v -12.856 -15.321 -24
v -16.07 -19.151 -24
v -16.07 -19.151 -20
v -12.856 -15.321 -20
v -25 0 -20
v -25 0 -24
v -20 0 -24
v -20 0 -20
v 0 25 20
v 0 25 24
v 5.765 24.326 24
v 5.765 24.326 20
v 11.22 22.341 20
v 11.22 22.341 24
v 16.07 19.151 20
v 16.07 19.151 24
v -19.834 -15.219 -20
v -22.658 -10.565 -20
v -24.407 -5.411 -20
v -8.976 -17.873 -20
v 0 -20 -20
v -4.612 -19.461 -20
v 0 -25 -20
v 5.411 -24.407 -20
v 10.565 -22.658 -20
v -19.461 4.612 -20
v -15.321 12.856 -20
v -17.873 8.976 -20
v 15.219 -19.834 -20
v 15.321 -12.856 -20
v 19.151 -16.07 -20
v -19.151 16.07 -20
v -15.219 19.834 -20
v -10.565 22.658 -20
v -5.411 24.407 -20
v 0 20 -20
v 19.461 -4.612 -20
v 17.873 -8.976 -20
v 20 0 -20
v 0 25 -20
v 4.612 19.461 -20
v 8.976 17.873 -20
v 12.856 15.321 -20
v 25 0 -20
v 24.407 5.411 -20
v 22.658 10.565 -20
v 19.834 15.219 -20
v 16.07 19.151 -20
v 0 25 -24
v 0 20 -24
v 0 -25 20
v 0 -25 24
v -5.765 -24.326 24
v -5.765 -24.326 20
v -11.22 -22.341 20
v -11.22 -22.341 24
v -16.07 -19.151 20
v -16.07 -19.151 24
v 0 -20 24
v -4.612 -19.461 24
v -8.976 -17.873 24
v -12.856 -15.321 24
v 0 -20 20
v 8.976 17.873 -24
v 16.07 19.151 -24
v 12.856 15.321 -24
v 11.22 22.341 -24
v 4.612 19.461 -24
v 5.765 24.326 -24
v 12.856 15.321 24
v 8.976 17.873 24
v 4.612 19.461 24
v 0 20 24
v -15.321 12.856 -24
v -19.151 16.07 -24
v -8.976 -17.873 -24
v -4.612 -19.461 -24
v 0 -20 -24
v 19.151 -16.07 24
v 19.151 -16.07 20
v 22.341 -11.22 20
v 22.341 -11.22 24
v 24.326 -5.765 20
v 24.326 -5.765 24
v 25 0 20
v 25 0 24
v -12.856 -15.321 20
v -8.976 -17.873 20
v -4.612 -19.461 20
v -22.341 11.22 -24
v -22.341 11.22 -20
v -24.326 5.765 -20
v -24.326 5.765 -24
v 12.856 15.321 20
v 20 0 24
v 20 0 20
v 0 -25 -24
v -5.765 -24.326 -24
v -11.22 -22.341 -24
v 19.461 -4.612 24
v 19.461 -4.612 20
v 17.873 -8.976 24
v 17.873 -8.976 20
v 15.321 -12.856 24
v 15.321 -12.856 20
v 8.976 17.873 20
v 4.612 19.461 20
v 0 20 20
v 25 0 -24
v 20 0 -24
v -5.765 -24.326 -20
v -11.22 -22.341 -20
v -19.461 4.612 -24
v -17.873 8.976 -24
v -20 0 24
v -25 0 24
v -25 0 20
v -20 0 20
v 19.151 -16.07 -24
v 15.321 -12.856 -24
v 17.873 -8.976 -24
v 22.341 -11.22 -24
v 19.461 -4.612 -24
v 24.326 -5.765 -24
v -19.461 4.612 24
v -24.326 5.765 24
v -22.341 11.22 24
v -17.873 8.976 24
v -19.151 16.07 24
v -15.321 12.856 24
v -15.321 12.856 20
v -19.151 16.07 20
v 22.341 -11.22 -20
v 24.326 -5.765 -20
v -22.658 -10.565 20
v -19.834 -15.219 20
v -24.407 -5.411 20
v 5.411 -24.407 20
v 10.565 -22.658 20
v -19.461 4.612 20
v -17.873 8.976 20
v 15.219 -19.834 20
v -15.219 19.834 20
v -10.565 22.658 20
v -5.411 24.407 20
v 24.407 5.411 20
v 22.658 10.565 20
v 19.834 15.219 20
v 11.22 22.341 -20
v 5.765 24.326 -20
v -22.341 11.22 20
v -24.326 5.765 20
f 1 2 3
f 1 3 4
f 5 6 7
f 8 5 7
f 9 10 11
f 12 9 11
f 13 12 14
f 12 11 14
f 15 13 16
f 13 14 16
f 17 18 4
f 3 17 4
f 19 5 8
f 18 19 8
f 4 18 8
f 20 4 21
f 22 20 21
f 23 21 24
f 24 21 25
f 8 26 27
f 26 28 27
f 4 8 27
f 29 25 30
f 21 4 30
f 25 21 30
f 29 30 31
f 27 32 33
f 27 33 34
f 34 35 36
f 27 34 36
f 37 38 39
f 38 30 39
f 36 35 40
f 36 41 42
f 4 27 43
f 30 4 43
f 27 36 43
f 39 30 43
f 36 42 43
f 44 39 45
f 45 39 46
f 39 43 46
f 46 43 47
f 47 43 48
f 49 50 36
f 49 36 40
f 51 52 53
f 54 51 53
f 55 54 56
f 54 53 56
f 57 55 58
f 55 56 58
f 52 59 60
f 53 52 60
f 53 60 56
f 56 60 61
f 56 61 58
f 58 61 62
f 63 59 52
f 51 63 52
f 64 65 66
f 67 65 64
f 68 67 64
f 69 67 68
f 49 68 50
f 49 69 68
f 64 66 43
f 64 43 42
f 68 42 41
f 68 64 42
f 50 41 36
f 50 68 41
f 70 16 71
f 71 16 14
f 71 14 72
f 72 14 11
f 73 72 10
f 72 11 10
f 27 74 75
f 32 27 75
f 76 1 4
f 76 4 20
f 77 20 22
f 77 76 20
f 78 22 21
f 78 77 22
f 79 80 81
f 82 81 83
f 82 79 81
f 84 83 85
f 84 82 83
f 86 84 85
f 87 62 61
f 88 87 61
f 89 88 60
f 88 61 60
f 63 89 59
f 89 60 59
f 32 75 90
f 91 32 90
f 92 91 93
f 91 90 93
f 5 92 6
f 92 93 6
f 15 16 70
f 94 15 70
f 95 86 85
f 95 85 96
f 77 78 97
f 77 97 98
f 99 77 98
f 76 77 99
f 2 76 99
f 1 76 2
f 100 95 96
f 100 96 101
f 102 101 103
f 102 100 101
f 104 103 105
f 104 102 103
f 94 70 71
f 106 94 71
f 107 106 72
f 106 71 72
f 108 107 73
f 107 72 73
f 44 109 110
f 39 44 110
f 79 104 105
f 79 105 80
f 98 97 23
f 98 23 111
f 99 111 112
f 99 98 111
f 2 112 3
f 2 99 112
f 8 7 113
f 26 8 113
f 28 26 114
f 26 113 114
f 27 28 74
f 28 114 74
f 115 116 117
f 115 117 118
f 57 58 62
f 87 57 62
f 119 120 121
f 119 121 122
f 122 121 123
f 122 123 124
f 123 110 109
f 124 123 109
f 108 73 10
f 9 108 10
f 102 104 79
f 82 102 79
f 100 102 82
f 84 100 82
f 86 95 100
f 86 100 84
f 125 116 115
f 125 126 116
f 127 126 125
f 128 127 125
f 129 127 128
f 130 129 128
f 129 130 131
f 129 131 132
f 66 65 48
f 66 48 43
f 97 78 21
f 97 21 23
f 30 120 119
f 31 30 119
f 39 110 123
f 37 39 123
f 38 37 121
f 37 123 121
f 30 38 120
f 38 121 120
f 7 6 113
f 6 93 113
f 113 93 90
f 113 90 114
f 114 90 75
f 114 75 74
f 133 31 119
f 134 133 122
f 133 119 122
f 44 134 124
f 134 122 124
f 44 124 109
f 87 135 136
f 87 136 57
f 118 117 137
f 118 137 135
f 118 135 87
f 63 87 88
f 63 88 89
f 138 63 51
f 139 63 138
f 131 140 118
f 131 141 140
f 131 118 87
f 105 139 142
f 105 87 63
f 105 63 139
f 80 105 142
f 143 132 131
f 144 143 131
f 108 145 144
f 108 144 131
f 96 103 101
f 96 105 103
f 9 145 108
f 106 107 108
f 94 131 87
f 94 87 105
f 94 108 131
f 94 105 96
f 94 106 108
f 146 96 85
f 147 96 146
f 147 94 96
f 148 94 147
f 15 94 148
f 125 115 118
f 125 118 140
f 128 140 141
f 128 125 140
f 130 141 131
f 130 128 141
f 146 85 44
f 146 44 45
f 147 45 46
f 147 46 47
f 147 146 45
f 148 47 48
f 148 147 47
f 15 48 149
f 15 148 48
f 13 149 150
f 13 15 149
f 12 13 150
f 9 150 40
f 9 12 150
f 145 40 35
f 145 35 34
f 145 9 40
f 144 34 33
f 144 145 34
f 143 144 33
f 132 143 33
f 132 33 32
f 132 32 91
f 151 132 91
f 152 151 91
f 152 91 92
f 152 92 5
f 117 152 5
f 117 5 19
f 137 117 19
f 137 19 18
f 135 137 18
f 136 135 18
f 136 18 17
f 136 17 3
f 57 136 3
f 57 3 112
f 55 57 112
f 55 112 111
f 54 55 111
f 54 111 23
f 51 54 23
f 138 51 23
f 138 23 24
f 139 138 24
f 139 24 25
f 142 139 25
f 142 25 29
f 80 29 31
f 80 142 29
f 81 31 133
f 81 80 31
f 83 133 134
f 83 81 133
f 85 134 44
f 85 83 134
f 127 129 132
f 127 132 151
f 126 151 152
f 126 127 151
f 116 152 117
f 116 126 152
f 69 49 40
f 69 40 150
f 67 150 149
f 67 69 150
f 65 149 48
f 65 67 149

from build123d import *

# Parameters (mm, degrees)
SKETCH1_R           = 25
BOSS_EXTRUDE1_DEPTH = 20
BOSS_EXTRUDE2_START = 4
BOSS_EXTRUDE2_DEPTH = 4


with BuildPart() as part:
    # Sketch1 → Boss-Extrude1 (new, symmetric)
    with BuildSketch(Plane.XY):
        Circle(SKETCH1_R)
    extrude(amount=BOSS_EXTRUDE1_DEPTH, both=True)

    # Sketch2 → Boss-Extrude2 (add)
    with BuildSketch(Plane.XY.offset(20).offset(BOSS_EXTRUDE2_START)):
        with BuildLine():
            Line((-25, 0), (-20, 0))
            ThreePointArc((-20, 0), (-18.793852416, 6.840402867), (-15.320888862, 12.855752194))
            Line((-15.320888862, 12.855752194), (-19.151111078, 16.069690242))
            ThreePointArc((-19.151111078, 16.069690242), (-23.49231552, 8.550503583), (-25, 0))
        make_face()
        with BuildLine():
            Line((16.069690242, 19.151111078), (12.855752194, 15.320888862))
            ThreePointArc((12.855752194, 15.320888862), (6.840402867, 18.793852416), (0, 20))
            Line((0, 20), (0, 25))
            ThreePointArc((0, 25), (8.550503583, 23.49231552), (16.069690242, 19.151111078))
        make_face()
        with BuildLine():
            Line((25, 0), (20, 0))
            ThreePointArc((20, 0), (18.793852416, -6.840402867), (15.320888862, -12.855752194))
            Line((15.320888862, -12.855752194), (19.151111078, -16.069690242))
            ThreePointArc((19.151111078, -16.069690242), (23.49231552, -8.550503583), (25, 0))
        make_face()
        with BuildLine():
            Line((0, -20), (0, -25))
            ThreePointArc((0, -25), (-8.550503583, -23.49231552), (-16.069690242, -19.151111078))
            Line((-16.069690242, -19.151111078), (-12.855752194, -15.320888862))
            ThreePointArc((-12.855752194, -15.320888862), (-6.840402867, -18.793852416), (0, -20))
        make_face()
    boss_extrude2 = extrude(amount=-BOSS_EXTRUDE2_DEPTH)

    # Mirror1: Boss-Extrude2 across plane
    add(boss_extrude2.mirror(Plane.XY))


solid = part.part
